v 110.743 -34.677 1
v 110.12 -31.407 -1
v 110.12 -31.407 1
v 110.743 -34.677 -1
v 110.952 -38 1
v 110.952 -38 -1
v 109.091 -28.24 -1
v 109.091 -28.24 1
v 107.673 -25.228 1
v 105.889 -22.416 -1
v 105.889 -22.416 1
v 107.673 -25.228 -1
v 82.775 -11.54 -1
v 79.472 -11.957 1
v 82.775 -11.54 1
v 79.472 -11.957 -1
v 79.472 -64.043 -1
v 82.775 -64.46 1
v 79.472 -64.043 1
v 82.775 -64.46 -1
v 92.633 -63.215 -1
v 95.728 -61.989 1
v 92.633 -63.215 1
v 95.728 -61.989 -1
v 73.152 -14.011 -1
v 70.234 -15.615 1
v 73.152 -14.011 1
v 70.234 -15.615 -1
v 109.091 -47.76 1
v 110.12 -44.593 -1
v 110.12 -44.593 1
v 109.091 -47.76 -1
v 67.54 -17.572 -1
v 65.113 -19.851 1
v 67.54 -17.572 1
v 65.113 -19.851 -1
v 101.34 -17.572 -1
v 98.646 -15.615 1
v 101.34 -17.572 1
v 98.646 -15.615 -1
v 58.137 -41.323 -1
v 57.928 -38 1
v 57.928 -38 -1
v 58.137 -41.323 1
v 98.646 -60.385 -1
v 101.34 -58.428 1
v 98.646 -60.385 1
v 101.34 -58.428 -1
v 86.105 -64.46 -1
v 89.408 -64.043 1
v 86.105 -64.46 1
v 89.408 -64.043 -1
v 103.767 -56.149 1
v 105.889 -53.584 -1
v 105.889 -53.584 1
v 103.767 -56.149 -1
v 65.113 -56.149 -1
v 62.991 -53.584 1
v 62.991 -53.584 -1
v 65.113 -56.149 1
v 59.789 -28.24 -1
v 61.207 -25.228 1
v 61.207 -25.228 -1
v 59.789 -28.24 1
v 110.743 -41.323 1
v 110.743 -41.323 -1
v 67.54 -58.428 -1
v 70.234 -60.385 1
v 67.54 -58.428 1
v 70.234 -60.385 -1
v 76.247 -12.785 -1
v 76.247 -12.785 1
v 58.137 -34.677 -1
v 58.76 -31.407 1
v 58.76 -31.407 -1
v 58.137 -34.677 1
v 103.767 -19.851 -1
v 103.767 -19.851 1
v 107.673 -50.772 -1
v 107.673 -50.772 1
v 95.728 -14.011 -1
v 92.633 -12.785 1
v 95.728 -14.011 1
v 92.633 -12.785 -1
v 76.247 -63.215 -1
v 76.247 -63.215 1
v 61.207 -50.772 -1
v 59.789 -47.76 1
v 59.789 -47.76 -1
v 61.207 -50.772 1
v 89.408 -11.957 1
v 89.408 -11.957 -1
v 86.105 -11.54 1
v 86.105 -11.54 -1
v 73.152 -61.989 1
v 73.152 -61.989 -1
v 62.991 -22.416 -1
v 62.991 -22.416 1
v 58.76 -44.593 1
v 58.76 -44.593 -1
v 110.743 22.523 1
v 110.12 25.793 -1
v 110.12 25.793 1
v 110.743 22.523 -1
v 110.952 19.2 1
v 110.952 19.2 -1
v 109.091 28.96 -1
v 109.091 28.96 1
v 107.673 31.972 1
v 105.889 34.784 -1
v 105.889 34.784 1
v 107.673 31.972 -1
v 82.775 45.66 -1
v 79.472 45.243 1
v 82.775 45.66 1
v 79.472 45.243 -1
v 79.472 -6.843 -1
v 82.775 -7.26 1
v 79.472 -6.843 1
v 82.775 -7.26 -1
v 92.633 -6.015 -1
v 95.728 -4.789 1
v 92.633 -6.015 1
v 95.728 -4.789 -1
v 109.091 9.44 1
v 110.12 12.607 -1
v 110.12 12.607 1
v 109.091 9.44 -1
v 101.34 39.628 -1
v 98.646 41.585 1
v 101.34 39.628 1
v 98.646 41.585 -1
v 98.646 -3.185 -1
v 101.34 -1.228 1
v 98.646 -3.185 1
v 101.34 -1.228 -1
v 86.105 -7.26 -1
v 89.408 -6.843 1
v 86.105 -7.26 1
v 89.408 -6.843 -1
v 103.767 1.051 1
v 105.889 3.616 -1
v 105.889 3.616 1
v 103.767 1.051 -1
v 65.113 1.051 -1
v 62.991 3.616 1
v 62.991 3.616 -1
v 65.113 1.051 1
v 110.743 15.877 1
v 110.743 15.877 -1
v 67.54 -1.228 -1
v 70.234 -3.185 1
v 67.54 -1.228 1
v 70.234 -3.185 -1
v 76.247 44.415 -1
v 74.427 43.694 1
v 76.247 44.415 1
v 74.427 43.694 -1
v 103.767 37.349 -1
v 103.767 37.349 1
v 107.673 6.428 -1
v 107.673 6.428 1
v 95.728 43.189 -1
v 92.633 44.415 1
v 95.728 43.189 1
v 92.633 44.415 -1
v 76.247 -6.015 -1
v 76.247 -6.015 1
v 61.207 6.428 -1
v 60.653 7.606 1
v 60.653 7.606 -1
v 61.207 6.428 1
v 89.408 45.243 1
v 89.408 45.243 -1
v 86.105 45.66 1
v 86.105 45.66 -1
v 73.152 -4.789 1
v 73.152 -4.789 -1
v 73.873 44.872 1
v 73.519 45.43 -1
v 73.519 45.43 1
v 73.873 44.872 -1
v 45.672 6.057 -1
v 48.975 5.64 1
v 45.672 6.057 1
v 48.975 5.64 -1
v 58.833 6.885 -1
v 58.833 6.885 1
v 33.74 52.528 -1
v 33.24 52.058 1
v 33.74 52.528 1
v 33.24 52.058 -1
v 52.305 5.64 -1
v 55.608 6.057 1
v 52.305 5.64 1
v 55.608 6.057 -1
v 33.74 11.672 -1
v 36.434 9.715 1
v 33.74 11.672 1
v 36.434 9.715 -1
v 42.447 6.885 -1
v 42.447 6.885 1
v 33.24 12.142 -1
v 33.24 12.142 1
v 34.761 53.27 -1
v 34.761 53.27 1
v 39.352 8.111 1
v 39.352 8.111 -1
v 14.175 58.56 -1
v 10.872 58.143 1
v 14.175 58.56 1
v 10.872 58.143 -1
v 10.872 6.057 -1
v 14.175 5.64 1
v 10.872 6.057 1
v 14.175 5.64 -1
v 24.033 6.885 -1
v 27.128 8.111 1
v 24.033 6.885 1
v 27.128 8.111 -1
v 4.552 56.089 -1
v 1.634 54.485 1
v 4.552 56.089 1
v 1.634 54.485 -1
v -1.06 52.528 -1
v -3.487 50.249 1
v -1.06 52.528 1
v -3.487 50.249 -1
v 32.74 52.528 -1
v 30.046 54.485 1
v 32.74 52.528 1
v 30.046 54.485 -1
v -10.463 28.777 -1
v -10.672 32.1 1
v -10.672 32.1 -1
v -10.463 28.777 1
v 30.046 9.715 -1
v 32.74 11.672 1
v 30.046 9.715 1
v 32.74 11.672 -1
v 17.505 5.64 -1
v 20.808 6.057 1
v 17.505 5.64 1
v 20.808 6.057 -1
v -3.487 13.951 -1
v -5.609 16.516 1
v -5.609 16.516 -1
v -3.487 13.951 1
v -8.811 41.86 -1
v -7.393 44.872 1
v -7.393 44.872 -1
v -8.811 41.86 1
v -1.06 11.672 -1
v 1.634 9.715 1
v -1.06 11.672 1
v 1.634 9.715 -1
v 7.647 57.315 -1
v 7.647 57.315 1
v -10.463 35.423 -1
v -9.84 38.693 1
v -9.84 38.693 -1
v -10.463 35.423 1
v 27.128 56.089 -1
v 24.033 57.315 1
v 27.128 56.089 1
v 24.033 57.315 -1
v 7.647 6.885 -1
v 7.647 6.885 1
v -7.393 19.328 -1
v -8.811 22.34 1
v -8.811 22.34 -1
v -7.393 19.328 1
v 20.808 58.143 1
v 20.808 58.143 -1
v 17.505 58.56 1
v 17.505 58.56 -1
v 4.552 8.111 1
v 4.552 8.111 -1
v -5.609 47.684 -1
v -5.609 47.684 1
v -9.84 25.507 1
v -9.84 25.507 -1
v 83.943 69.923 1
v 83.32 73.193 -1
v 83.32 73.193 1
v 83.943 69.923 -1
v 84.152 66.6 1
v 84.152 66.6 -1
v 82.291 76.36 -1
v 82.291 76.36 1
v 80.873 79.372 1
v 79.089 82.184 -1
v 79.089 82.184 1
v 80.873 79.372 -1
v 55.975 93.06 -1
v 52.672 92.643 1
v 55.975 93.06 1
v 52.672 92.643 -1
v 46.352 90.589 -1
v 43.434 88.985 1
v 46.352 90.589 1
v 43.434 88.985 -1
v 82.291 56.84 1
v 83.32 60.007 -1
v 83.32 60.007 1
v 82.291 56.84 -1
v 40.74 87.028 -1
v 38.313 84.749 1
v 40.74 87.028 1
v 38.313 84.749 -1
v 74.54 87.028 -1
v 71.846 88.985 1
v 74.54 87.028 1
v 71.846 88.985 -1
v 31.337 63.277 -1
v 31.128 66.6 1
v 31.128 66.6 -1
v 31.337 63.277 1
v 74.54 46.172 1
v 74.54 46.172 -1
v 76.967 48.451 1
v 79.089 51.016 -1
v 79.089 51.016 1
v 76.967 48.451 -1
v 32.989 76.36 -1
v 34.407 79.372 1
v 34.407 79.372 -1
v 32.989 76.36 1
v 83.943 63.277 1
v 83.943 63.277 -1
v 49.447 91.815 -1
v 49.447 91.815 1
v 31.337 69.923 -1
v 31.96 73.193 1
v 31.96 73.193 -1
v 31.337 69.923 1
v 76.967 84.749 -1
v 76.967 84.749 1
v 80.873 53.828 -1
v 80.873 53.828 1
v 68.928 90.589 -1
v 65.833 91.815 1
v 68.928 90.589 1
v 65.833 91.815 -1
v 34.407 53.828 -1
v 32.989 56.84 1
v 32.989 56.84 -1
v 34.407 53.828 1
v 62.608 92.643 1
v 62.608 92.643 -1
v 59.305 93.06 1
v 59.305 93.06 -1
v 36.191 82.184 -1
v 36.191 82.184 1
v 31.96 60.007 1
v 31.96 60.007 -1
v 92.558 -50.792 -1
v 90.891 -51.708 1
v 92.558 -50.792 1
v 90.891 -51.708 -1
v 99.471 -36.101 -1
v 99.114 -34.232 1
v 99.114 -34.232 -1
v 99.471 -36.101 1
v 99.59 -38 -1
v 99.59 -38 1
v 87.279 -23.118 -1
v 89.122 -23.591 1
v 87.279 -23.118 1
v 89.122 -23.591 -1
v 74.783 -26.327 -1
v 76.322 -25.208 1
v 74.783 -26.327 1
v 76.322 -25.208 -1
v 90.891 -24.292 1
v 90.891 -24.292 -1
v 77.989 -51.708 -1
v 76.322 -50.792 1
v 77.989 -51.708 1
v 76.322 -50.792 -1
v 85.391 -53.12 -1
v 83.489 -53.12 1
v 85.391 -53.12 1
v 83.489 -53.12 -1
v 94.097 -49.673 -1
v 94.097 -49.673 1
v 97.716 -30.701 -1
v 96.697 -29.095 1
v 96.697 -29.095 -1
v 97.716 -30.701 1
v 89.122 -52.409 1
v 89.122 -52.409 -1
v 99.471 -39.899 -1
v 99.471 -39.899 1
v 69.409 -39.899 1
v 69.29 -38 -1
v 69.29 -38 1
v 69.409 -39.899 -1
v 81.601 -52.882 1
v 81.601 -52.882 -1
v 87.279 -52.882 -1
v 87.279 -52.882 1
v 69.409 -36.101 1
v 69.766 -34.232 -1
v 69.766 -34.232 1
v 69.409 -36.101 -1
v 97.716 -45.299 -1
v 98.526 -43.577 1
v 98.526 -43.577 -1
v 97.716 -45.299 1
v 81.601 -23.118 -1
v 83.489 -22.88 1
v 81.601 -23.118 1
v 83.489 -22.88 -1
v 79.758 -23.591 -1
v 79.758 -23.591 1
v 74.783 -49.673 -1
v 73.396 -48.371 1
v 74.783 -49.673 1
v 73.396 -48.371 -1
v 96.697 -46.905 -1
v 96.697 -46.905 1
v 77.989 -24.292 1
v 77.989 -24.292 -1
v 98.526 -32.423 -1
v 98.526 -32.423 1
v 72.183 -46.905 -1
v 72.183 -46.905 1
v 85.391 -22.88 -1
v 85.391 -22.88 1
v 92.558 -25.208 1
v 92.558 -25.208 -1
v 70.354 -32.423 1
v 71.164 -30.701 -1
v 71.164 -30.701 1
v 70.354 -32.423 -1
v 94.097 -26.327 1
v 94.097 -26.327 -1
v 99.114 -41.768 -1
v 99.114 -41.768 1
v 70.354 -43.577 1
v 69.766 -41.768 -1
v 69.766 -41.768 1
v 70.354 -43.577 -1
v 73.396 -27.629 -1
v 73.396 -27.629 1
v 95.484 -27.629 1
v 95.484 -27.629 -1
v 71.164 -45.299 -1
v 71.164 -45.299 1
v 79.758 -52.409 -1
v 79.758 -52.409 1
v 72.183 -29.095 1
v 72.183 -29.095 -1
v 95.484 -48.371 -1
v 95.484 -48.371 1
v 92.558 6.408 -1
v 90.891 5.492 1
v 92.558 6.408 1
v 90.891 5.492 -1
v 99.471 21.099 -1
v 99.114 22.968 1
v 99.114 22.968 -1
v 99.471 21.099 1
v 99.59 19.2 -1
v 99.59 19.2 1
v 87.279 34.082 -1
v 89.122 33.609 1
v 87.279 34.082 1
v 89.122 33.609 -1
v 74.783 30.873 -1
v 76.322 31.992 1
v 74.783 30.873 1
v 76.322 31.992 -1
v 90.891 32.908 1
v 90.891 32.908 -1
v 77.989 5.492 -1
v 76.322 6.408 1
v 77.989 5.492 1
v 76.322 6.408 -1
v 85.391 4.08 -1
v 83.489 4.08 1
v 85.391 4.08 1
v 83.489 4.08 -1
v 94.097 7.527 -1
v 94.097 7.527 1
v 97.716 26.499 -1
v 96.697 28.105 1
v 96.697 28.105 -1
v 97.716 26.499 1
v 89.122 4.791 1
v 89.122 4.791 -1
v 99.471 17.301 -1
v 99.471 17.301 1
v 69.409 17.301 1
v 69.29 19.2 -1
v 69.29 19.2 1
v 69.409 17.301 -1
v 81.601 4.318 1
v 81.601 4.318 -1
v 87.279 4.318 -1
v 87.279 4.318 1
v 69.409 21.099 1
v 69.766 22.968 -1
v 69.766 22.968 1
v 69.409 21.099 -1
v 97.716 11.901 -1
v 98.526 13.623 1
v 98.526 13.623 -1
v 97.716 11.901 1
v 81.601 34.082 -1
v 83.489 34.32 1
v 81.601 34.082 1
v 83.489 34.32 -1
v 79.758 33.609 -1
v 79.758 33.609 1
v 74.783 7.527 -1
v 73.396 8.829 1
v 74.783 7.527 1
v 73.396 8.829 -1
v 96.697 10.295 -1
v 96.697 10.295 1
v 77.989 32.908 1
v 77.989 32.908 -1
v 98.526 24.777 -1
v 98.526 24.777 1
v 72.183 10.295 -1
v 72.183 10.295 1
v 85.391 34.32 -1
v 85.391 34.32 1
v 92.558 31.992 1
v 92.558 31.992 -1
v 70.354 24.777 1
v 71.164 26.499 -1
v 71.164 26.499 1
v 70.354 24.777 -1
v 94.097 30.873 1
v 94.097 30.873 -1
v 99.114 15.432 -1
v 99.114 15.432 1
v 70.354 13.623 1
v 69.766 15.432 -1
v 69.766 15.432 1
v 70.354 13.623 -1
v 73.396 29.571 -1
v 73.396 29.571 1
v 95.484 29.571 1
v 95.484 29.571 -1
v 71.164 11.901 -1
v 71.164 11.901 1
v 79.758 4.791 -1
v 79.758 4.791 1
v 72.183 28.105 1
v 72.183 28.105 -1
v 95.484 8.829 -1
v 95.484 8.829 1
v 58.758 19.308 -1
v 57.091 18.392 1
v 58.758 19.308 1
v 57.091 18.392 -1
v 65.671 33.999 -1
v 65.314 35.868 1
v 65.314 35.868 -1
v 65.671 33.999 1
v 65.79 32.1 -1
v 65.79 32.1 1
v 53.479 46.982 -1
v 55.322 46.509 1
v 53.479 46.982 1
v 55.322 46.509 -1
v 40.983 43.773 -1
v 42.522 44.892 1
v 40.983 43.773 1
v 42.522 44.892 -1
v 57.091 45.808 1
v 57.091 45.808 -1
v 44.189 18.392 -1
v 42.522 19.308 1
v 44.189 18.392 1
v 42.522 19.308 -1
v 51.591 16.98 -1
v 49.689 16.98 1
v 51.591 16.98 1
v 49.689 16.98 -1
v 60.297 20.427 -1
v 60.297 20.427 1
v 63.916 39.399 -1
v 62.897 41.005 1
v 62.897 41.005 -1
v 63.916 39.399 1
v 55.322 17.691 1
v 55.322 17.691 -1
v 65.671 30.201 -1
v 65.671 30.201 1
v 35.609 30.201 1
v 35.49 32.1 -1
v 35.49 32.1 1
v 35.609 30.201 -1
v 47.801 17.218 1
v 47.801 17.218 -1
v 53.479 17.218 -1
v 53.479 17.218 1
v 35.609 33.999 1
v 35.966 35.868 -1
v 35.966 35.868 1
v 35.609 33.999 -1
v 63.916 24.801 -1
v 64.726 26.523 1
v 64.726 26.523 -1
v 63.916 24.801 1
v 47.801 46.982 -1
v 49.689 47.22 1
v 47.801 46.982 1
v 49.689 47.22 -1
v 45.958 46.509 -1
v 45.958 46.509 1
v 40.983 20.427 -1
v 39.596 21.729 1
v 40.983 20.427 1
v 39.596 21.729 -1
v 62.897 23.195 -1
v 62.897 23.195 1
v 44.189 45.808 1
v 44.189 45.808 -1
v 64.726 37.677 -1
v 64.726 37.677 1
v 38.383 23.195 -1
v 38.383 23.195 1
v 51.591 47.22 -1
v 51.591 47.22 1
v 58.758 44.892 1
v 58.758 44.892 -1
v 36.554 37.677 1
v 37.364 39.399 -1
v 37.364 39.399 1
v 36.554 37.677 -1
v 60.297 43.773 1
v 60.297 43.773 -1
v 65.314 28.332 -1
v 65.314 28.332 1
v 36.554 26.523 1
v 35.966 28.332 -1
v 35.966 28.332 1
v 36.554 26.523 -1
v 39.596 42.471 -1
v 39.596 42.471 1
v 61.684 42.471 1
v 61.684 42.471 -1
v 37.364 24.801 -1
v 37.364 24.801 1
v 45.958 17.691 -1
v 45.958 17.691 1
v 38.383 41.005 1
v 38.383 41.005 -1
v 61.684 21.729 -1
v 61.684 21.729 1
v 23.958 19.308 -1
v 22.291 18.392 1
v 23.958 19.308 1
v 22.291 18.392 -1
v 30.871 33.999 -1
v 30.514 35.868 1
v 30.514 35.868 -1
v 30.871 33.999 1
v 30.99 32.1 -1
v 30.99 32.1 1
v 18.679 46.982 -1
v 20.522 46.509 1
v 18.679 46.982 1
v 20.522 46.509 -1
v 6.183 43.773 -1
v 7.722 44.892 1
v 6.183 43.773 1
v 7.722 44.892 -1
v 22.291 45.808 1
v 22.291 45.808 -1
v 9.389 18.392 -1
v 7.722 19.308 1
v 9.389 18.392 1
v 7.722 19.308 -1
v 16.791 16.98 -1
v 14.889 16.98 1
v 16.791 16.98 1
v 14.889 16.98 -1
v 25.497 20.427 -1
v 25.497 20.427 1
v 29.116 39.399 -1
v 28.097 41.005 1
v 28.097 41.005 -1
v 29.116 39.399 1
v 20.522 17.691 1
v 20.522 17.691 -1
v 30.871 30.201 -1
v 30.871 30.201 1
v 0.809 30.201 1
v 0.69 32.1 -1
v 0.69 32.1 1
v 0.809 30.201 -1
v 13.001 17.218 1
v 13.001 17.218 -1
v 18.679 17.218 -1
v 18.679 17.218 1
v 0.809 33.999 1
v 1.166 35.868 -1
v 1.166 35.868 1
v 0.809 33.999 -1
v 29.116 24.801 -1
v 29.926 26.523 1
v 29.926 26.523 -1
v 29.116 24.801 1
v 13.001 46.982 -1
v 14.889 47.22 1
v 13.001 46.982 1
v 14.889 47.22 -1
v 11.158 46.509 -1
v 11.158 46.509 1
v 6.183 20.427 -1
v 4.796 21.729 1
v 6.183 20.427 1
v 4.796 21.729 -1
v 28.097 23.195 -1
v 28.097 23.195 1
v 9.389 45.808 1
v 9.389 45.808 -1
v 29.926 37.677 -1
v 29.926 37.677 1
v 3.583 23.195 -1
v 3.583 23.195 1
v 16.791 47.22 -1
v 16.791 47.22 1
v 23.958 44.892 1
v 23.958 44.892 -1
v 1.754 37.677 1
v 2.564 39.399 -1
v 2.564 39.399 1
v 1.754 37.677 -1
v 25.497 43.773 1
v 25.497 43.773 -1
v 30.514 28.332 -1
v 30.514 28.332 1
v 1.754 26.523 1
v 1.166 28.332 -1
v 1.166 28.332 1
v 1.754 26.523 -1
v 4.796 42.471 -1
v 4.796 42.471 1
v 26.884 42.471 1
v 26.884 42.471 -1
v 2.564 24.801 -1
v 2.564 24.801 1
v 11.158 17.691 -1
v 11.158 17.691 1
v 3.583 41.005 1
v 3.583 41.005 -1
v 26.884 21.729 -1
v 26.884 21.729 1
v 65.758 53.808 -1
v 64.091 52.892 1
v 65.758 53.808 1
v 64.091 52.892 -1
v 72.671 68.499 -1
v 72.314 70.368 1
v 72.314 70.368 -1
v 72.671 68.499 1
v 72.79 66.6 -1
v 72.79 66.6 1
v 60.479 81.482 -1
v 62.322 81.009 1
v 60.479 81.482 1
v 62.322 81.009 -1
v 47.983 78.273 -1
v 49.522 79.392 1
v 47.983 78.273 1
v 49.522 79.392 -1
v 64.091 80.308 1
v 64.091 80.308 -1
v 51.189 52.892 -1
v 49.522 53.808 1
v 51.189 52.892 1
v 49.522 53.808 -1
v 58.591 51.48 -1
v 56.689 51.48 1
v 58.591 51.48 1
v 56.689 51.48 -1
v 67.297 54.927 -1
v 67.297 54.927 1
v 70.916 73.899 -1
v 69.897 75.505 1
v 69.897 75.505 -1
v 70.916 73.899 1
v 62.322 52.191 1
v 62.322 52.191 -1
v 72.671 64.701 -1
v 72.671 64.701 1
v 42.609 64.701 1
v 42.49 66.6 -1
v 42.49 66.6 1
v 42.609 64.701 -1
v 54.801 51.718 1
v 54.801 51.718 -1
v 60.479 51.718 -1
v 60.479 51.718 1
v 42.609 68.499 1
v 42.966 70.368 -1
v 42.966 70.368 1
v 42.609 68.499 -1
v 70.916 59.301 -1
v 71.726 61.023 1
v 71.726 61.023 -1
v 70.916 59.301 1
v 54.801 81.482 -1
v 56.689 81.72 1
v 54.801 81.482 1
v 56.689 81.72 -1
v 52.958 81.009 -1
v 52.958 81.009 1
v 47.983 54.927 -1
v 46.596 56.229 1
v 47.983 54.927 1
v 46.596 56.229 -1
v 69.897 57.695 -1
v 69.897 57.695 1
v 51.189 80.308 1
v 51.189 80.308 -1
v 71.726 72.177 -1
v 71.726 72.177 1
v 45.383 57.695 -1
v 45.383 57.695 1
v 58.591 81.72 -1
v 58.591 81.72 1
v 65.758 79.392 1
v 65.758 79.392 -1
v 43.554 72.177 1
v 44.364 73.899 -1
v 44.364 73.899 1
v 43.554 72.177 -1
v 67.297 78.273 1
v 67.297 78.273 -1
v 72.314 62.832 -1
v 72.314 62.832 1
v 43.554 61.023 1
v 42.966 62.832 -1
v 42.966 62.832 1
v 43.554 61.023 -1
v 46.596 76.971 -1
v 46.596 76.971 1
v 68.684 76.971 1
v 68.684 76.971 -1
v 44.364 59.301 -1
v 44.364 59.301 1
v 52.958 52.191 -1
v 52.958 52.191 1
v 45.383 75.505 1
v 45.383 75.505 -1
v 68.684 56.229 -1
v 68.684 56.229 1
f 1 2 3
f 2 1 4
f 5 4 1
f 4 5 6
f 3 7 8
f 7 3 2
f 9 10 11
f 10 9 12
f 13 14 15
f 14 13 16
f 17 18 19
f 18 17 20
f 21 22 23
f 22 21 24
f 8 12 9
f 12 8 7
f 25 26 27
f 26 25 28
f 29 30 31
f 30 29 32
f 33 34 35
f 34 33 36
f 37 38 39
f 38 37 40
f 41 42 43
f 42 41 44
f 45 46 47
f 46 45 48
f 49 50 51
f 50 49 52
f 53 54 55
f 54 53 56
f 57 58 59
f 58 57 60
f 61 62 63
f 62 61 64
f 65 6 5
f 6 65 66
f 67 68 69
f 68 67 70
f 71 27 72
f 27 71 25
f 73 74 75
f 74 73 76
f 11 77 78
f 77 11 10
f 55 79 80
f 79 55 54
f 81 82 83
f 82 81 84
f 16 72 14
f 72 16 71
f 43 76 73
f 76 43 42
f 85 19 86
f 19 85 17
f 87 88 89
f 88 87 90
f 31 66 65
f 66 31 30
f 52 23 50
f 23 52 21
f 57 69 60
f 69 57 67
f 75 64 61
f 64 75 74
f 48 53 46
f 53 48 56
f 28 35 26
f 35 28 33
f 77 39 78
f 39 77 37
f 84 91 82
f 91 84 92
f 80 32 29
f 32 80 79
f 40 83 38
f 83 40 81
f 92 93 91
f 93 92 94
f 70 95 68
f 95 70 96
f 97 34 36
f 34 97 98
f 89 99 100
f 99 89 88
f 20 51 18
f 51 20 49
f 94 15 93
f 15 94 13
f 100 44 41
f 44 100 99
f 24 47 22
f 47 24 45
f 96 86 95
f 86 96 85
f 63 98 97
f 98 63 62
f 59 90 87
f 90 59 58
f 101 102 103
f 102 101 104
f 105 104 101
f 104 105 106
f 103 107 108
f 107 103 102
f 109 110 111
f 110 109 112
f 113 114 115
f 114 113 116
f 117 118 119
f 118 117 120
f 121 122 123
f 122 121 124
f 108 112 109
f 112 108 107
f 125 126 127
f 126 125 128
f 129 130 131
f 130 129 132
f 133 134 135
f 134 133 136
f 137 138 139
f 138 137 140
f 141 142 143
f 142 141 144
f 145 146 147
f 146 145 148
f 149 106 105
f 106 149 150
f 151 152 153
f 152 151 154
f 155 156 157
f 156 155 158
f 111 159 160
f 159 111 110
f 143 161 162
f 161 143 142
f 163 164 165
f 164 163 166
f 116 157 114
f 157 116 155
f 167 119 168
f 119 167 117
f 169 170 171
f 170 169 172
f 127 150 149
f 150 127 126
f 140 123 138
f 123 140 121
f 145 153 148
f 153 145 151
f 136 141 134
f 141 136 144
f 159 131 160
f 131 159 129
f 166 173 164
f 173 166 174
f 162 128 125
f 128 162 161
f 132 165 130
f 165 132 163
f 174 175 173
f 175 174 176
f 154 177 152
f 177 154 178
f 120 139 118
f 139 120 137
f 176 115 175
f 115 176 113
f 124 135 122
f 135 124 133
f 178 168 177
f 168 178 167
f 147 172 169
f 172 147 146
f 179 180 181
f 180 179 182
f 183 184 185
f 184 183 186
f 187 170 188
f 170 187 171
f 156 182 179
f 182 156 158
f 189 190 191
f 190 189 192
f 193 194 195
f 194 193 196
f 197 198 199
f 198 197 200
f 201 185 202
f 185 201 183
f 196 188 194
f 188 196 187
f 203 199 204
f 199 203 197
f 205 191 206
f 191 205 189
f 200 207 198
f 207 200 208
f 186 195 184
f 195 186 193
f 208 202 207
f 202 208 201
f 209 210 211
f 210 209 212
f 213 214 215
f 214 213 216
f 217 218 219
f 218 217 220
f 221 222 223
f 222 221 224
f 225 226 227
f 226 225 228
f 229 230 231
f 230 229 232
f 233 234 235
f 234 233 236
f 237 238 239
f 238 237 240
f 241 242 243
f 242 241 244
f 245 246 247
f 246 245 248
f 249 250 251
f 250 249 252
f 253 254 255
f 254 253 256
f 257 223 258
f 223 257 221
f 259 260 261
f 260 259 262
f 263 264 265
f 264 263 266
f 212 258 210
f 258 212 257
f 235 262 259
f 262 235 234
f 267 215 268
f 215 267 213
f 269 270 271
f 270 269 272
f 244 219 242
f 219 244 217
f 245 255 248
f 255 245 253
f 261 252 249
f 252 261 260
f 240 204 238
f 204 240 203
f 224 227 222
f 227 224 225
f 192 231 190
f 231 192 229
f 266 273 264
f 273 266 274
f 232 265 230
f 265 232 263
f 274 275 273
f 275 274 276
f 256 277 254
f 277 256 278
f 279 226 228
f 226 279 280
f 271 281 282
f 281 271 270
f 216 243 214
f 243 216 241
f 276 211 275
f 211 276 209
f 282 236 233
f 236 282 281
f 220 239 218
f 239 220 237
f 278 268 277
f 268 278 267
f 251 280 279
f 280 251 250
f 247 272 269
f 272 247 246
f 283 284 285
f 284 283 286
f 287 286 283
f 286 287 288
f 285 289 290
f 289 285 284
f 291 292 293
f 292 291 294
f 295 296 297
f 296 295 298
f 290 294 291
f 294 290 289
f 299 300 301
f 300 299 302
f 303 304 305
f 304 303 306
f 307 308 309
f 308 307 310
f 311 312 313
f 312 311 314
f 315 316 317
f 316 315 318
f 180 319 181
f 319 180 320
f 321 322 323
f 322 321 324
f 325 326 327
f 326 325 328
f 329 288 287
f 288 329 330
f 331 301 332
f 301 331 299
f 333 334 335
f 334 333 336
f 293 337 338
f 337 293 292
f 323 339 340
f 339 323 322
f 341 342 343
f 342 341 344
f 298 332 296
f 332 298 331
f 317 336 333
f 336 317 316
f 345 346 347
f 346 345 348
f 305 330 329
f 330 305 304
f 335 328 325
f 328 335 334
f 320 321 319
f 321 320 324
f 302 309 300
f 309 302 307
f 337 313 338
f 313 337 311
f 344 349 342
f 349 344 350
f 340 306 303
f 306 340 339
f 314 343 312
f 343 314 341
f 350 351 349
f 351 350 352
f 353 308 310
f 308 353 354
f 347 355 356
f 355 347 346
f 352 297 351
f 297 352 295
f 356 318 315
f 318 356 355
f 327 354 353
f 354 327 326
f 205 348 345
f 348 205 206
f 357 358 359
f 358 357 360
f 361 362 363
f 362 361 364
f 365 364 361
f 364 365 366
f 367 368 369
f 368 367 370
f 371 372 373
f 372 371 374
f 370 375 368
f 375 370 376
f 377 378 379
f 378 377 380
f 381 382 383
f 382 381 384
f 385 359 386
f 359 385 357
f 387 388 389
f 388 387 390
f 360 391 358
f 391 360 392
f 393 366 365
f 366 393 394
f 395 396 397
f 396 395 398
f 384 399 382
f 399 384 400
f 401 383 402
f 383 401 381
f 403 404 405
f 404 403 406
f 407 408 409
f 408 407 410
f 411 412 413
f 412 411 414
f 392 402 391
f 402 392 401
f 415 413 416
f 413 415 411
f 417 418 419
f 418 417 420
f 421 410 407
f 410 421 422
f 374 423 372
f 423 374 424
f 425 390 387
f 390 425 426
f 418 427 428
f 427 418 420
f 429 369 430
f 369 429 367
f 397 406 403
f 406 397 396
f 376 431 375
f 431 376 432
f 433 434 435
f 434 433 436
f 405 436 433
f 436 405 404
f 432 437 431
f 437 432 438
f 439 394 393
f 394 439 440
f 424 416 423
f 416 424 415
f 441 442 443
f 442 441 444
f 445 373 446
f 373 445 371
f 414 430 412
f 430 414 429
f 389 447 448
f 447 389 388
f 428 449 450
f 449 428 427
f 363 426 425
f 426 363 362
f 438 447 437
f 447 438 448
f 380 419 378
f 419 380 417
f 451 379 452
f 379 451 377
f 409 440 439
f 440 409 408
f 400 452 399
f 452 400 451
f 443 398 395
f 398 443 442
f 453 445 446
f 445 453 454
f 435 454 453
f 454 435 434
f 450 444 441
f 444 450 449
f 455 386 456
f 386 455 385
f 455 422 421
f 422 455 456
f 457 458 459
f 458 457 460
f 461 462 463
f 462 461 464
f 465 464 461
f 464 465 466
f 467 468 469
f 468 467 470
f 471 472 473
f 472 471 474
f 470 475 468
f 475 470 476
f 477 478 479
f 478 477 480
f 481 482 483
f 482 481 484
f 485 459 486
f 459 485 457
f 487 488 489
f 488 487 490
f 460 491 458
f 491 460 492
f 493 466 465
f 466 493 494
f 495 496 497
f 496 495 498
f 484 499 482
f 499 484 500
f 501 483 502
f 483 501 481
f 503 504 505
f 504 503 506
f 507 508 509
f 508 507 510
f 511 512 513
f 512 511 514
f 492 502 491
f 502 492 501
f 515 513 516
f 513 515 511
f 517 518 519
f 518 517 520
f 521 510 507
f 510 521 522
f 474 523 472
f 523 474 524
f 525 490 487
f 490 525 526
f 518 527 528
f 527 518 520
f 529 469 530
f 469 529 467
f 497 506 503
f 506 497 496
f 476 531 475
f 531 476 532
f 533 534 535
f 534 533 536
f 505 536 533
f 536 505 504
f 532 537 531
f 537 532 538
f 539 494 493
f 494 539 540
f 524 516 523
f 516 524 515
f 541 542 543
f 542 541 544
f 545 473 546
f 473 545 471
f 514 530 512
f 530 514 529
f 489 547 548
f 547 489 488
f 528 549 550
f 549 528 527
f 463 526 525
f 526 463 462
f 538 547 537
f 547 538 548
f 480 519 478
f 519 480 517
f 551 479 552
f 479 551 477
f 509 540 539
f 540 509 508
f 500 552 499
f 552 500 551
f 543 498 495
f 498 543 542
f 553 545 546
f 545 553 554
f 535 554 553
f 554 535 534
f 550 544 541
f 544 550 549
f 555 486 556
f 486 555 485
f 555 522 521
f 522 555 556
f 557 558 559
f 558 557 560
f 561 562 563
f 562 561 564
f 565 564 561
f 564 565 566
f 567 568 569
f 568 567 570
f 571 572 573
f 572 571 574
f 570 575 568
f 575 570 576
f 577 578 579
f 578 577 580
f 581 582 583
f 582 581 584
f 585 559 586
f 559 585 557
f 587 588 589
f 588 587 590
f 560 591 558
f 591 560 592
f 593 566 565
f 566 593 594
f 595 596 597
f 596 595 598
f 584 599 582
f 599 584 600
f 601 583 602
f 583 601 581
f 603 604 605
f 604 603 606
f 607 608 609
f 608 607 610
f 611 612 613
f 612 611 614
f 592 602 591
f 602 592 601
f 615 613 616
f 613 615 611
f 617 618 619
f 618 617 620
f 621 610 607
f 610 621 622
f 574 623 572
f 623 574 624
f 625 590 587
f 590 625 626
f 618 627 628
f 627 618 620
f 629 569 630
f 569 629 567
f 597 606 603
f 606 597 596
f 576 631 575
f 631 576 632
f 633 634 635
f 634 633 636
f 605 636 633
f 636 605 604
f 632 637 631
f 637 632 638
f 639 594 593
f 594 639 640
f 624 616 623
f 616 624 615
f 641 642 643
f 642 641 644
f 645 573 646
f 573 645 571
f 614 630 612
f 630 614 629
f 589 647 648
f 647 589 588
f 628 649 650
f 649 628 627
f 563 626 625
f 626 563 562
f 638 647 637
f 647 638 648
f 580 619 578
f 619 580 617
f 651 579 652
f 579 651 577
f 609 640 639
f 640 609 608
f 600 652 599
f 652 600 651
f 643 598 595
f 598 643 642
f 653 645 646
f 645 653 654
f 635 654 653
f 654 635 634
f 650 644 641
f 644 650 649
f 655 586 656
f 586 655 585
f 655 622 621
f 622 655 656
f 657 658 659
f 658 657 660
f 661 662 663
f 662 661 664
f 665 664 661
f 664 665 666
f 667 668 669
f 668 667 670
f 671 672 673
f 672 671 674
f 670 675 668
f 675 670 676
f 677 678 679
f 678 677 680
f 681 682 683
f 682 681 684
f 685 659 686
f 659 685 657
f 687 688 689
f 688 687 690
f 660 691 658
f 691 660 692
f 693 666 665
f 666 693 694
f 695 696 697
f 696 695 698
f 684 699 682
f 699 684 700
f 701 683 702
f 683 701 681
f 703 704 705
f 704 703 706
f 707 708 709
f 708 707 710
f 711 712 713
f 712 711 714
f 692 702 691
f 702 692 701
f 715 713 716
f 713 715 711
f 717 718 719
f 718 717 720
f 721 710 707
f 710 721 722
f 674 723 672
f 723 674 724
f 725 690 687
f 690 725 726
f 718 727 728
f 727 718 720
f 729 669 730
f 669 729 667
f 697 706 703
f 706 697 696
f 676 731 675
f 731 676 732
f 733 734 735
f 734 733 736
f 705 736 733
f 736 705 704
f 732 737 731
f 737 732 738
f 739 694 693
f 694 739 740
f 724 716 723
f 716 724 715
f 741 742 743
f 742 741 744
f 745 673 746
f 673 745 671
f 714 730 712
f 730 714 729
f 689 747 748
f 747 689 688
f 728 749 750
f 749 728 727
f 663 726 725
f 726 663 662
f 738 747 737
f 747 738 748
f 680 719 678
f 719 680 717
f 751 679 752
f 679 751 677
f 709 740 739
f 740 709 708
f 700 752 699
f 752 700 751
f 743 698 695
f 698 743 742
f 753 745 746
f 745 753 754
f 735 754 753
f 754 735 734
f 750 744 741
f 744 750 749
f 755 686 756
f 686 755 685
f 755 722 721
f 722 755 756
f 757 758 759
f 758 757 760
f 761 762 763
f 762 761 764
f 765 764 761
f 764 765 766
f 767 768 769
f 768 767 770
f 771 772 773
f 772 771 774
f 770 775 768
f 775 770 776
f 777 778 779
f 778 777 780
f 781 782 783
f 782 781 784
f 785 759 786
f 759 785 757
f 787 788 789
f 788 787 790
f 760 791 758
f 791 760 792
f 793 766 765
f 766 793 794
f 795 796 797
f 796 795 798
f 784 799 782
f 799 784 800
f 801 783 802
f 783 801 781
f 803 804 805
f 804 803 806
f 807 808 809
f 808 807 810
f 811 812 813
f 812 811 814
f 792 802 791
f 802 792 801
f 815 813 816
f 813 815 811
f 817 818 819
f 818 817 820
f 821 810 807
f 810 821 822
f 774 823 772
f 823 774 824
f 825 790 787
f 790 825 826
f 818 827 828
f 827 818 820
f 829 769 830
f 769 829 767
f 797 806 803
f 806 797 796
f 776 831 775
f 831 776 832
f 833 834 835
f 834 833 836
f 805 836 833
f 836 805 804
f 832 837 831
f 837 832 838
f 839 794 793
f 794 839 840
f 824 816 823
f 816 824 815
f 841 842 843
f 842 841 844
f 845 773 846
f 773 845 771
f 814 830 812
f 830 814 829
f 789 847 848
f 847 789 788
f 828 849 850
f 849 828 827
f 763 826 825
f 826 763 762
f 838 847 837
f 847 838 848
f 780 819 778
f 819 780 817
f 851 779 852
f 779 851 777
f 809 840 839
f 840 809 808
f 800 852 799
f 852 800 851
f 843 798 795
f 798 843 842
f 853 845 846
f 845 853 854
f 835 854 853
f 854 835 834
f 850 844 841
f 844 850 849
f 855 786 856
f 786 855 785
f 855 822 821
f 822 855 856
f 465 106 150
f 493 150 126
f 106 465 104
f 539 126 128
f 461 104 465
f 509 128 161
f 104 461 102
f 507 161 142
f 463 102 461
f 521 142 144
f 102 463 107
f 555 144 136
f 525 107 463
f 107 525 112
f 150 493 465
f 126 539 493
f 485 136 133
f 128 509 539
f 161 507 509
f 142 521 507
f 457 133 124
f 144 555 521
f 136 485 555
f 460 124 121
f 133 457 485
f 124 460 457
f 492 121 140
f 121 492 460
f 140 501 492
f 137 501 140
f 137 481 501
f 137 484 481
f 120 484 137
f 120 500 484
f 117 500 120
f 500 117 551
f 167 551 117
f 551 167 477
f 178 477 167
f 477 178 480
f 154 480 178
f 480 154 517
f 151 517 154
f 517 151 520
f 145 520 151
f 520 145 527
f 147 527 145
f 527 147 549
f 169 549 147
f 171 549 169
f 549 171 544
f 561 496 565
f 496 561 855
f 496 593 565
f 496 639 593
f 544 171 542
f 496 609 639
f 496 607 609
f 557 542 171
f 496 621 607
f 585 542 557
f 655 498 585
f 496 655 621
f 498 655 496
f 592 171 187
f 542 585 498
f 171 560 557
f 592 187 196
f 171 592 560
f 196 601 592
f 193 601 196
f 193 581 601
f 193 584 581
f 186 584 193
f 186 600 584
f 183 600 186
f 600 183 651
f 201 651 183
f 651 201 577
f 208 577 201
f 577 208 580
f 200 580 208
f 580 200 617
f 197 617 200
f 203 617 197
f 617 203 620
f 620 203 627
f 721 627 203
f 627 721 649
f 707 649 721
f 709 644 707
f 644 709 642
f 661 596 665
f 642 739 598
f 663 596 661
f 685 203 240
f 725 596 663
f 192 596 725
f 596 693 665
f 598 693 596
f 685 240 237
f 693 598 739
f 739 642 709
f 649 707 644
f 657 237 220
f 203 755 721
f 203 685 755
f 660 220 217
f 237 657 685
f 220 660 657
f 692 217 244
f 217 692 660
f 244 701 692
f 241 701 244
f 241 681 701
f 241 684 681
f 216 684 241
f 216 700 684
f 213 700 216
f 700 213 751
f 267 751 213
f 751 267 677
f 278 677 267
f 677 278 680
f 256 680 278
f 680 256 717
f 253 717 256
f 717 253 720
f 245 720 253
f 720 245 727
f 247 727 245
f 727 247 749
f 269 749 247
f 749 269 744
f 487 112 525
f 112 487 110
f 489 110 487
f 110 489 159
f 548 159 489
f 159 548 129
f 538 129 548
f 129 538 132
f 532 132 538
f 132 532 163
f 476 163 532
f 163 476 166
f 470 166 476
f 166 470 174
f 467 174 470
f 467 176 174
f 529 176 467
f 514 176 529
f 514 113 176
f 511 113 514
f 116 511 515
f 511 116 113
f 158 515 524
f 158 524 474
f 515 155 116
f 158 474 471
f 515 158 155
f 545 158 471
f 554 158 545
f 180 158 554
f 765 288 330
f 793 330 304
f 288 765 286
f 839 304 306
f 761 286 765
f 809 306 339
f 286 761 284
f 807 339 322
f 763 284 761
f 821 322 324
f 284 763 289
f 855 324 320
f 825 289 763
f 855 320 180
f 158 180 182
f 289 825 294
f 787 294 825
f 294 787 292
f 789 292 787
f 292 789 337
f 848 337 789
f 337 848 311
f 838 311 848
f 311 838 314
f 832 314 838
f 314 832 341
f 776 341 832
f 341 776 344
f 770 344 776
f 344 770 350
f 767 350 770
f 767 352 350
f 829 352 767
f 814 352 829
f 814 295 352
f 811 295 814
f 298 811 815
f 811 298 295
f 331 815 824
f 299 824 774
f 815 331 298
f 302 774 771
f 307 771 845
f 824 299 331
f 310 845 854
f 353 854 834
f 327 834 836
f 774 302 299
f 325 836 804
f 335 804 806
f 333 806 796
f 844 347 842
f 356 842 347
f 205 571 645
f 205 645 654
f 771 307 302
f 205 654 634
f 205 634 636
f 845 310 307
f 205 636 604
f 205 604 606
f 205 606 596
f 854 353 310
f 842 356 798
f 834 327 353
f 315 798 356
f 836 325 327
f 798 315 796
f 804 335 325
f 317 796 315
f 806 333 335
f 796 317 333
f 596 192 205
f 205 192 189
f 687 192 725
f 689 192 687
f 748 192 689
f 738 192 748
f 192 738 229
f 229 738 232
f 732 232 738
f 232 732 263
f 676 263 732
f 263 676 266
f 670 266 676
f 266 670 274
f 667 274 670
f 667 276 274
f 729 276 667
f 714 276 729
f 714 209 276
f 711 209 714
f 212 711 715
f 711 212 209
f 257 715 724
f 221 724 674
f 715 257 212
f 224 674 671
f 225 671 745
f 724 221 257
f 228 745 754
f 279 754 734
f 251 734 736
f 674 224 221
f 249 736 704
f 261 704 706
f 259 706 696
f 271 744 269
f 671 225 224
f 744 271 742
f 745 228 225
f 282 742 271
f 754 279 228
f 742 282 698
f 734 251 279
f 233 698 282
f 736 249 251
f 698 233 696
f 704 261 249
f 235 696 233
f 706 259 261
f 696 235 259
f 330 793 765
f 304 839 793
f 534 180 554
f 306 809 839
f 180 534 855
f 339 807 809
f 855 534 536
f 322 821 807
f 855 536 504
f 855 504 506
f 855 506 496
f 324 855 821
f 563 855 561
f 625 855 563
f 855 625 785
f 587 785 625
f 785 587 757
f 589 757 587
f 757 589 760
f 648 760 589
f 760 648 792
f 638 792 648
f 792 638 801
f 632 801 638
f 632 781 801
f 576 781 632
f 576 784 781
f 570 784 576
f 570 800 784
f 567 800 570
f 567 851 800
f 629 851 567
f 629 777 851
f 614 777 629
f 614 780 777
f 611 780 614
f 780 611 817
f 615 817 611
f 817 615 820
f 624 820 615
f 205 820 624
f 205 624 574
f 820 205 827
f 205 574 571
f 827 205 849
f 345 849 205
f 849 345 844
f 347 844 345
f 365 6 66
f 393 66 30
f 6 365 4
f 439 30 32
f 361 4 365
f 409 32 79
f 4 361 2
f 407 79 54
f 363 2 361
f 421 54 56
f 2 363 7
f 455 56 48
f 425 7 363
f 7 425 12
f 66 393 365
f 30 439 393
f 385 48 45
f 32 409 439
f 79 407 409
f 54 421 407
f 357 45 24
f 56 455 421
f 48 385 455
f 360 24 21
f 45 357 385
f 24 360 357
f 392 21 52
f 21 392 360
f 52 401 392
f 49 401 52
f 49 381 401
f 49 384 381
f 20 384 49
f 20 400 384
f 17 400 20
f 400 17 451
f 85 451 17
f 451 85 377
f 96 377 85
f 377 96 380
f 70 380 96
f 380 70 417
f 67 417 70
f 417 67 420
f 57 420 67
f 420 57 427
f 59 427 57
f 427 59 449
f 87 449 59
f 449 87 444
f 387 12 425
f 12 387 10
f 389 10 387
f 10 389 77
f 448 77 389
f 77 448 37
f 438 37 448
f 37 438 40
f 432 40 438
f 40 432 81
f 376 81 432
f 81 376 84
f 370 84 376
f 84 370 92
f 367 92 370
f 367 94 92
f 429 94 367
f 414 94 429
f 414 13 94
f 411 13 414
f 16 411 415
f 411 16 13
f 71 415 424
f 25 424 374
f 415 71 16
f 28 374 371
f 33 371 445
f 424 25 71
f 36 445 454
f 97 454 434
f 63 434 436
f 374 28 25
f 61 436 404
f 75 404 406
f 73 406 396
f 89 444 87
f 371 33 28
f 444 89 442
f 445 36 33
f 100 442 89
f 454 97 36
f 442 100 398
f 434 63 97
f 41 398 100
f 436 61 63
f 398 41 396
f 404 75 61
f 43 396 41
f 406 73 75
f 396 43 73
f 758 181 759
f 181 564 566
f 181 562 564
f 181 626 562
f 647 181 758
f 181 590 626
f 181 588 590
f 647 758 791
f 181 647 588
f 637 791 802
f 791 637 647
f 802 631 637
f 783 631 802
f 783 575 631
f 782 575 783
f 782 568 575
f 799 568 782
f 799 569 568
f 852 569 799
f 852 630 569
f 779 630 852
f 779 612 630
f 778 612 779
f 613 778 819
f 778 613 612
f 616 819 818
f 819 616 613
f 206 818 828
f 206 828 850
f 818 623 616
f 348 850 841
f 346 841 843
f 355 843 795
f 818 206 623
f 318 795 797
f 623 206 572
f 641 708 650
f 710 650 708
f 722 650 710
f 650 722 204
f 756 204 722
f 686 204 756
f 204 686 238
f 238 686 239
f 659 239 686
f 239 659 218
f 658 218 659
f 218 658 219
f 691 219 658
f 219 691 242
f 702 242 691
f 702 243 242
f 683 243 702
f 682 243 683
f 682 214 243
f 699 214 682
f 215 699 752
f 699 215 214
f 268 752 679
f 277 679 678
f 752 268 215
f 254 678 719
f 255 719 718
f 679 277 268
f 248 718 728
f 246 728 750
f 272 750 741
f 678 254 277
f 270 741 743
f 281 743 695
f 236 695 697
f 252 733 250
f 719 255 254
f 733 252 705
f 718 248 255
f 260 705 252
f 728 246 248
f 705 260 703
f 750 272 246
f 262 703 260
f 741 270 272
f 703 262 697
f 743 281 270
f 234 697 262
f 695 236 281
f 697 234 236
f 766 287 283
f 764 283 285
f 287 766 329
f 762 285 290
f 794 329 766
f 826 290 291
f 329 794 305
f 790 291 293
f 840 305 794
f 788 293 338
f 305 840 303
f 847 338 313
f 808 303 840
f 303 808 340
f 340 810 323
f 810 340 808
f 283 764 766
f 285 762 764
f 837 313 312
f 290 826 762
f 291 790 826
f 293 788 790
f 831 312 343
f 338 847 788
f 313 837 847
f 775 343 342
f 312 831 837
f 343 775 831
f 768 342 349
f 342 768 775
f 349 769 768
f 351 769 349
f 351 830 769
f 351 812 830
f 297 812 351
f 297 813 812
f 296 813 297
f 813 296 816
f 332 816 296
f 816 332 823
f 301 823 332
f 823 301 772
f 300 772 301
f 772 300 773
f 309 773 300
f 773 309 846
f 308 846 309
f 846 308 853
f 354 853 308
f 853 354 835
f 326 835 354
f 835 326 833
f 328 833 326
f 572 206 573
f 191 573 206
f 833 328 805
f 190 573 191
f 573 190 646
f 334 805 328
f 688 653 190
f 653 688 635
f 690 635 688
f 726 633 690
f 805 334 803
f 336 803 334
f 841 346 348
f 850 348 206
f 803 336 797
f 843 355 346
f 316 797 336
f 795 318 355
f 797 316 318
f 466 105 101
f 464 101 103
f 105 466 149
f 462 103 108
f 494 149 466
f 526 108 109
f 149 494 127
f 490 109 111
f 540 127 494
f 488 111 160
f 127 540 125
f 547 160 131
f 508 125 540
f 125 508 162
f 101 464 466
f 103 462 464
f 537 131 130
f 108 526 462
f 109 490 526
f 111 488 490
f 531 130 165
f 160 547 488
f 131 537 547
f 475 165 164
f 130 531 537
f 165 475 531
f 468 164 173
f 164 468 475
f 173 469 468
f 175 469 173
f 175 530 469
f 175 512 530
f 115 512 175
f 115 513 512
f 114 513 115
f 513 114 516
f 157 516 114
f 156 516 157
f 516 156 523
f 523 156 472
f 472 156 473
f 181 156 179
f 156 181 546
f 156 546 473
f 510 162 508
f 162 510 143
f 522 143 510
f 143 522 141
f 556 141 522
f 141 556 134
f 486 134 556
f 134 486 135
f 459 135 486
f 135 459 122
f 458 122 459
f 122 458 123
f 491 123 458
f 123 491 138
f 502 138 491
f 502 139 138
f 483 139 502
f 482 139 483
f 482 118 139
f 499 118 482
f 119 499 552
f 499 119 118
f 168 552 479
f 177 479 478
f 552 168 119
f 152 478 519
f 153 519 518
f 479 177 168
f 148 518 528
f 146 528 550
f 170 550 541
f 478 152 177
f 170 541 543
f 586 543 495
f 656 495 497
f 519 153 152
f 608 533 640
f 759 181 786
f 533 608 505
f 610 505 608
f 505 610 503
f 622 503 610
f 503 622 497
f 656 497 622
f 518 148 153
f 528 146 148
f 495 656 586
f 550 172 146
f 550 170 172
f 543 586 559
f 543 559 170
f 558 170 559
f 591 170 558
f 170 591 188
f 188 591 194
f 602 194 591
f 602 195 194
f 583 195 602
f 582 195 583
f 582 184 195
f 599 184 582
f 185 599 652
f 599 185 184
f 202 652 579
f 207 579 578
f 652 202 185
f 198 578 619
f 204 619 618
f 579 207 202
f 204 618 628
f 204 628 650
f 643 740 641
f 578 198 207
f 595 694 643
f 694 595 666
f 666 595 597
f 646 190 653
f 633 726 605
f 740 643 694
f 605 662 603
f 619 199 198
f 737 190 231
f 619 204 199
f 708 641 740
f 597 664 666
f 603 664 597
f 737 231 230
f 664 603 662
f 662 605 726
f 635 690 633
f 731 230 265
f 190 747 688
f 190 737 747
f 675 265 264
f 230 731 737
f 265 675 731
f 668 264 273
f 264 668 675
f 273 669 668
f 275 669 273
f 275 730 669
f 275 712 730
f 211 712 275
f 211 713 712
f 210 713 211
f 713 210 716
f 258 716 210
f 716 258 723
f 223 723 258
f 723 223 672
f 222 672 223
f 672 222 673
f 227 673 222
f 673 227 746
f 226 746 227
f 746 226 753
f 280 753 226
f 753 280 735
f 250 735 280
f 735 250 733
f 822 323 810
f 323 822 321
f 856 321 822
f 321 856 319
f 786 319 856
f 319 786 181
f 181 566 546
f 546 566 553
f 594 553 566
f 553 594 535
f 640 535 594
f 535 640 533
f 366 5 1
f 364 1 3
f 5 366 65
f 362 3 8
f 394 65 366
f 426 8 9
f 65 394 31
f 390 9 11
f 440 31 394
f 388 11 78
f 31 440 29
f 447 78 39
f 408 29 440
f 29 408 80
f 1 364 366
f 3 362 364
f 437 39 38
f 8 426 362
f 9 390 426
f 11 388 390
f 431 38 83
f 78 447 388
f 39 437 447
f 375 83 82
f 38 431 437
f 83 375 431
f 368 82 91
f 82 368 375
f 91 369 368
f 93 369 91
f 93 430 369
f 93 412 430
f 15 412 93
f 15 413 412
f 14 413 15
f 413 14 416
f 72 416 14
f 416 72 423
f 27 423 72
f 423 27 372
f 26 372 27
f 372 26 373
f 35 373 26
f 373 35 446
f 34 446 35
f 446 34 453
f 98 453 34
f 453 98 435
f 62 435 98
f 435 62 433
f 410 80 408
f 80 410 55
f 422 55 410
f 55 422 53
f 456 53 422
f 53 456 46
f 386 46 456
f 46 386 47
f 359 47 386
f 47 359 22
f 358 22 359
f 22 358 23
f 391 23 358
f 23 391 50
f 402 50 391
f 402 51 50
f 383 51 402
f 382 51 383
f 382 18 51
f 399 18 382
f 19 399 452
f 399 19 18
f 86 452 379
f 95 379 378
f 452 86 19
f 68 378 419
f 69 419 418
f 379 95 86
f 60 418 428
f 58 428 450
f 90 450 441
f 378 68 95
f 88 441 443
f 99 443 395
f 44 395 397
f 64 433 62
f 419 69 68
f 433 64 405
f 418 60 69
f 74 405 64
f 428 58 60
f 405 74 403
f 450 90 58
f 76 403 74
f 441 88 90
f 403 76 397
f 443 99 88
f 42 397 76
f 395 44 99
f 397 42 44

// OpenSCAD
// file: roundedcube.scad
// More information: https://danielupshaw.com/openscad-rounded-corners/

// Set to 0.01 for higher definition curves (renders slower)
$fs = 0.15;

module roundedcube(size = [1, 1, 1], center = false, radius = 0.5, apply_to = "all") {
	// If single value, convert to [x, y, z] vector
	size = (size[0] == undef) ? [size, size, size] : size;

	translate_min = radius;
	translate_xmax = size[0] - radius;
	translate_ymax = size[1] - radius;
	translate_zmax = size[2] - radius;

	diameter = radius * 2;

	obj_translate = (center == false) ?
		[0, 0, 0] : [
			-(size[0] / 2),
			-(size[1] / 2),
			-(size[2] / 2)
		];

	translate(v = obj_translate) {
		hull() {
			for (translate_x = [translate_min, translate_xmax]) {
				x_at = (translate_x == translate_min) ? "min" : "max";
				for (translate_y = [translate_min, translate_ymax]) {
					y_at = (translate_y == translate_min) ? "min" : "max";
					for (translate_z = [translate_min, translate_zmax]) {
						z_at = (translate_z == translate_min) ? "min" : "max";

						translate(v = [translate_x, translate_y, translate_z])
						if (
							(apply_to == "all") ||
							(apply_to == "xmin" && x_at == "min") || (apply_to == "xmax" && x_at == "max") ||
							(apply_to == "ymin" && y_at == "min") || (apply_to == "ymax" && y_at == "max") ||
							(apply_to == "zmin" && z_at == "min") || (apply_to == "zmax" && z_at == "max")
						) {
							sphere(r = radius);
						} else {
							rotate = 
								(apply_to == "xmin" || apply_to == "xmax" || apply_to == "x") ? [0, 90, 0] : (
								(apply_to == "ymin" || apply_to == "ymax" || apply_to == "y") ? [90, 90, 0] :
								[0, 0, 0]
							);
							rotate(a = rotate)
							cylinder(h = diameter, r = radius, center = true);
						}
					}
				}
			}
		}
	}
}
// file: parameters.scad
/* Copyright Brian Stephan 2023
 *
 * This file is part of the Buildable Stick System.
 *
 * The Buildable Stick System is free software: you can redistribute it and/or modify
 * it under the terms of the GNU General Public License as published by the
 * Free Software Foundation, either version 3 of the License, or (at your
 * option) any later version.
 *
 * The Buildable Stick System is distributed in the hope that it will be useful, but
 * WITHOUT ANY WARRANTY; without even the implied warranty of MERCHANTABILITY
 * or FITNESS FOR A PARTICULAR PURPOSE. See the GNU General Public License for
 * more details.
 *
 * You should have received a copy of the GNU General Public License along with
 * the Buildable Stick System. If not, see <https://www.gnu.org/licenses/>.
 */

// adjustments
hole_tolerance = 0.15;

// M2
m2_screw_selftap_radius = 0.95;

// M3
m3_screw_selftap_radius = 1.3;

// M4
m4_bolt_radius = 2 + hole_tolerance;
m4_bolt_countersink_radius = 6.1 + hole_tolerance;
m4_bolt_hex_exterior_radius = 3.6 + hole_tolerance;

// 24mm button
small_button_radius = 12 + hole_tolerance;

// 30mm button
big_button_radius = 15 + hole_tolerance;

// JLF mount dimensions
lever_mount_x = 53;
lever_mount_y = 95;
lever_mount_z = 2;

// standard lever hole
lever_plate_hole = 12;

// case dimensions
// base frame box. reminder: top of inside (including mounts) is chopped by top_plate_z for plates
frame_x = 233;
frame_y = 208;
frame_z = 50;

// depth of the "lip" of the frame that the top plate sets into/supports the overhang
frame_wall = 4;

// per neutrik (mm)
neutrik_panel_thickness = 3;

// top plate, which can either be the whole plate ("inset") or the mounting frame for a plate that overhangs
top_plate_x = frame_x - (frame_wall * 2);
top_plate_y = frame_y - (frame_wall * 2);
top_plate_z = 5;

// how much the top plate x/y is expanded to overhang the frame
// note that this is relative to the top plate (so the wall is added back)
top_plate_overhang_amount = 8.5;
overhang_top_plate_x = top_plate_x + (frame_wall * 2) + (top_plate_overhang_amount * 2);
overhang_top_plate_y = top_plate_y + (frame_wall * 2) + (top_plate_overhang_amount * 2);

plate_to_frame_point_x = (top_plate_x/2)-10;
plate_to_frame_point_y = (top_plate_y/2)-10;

// frame interior that supports the top plates
panel_support_width = 5;

// neutrik D screw holes
neutrik_d_screw_radius = 1.6 + hole_tolerance;
neutrik_d_radius = 12 + hole_tolerance;

// additional button radius for decorative panels, etc.
decorative_radius_scale = 1.75;
jumbo_decorative_radius_scale = 2;
// main file
/* Copyright Brian Stephan 2023
 *
 * This file is part of the Buildable Stick System.
 *
 * The Buildable Stick System is free software: you can redistribute it and/or modify
 * it under the terms of the GNU General Public License as published by the
 * Free Software Foundation, either version 3 of the License, or (at your
 * option) any later version.
 *
 * The Buildable Stick System is distributed in the hope that it will be useful, but
 * WITHOUT ANY WARRANTY; without even the implied warranty of MERCHANTABILITY
 * or FITNESS FOR A PARTICULAR PURPOSE. See the GNU General Public License for
 * more details.
 *
 * You should have received a copy of the GNU General Public License along with
 * the Buildable Stick System. If not, see <https://www.gnu.org/licenses/>.
 */

include <parameters.scad>
include <components.scad>

module dir_arc_plus_w_30mm_decorative_plate() {
	difference() {
		// get a 2mm slice of the bigger button cylinders
		translate([0, 0, -55]) dir_arc_w_30mm();
		translate([0, 0, -100]) cube([500, 500, 198], center=true);
		translate([0, 0, 100]) cube([500, 500, 198], center=true);
		// cut out the normal holes
		translate([0, 0, -1]) dir_arc_w_30mm();
	}
}

dir_arc_plus_w_30mm_decorative_plate();
